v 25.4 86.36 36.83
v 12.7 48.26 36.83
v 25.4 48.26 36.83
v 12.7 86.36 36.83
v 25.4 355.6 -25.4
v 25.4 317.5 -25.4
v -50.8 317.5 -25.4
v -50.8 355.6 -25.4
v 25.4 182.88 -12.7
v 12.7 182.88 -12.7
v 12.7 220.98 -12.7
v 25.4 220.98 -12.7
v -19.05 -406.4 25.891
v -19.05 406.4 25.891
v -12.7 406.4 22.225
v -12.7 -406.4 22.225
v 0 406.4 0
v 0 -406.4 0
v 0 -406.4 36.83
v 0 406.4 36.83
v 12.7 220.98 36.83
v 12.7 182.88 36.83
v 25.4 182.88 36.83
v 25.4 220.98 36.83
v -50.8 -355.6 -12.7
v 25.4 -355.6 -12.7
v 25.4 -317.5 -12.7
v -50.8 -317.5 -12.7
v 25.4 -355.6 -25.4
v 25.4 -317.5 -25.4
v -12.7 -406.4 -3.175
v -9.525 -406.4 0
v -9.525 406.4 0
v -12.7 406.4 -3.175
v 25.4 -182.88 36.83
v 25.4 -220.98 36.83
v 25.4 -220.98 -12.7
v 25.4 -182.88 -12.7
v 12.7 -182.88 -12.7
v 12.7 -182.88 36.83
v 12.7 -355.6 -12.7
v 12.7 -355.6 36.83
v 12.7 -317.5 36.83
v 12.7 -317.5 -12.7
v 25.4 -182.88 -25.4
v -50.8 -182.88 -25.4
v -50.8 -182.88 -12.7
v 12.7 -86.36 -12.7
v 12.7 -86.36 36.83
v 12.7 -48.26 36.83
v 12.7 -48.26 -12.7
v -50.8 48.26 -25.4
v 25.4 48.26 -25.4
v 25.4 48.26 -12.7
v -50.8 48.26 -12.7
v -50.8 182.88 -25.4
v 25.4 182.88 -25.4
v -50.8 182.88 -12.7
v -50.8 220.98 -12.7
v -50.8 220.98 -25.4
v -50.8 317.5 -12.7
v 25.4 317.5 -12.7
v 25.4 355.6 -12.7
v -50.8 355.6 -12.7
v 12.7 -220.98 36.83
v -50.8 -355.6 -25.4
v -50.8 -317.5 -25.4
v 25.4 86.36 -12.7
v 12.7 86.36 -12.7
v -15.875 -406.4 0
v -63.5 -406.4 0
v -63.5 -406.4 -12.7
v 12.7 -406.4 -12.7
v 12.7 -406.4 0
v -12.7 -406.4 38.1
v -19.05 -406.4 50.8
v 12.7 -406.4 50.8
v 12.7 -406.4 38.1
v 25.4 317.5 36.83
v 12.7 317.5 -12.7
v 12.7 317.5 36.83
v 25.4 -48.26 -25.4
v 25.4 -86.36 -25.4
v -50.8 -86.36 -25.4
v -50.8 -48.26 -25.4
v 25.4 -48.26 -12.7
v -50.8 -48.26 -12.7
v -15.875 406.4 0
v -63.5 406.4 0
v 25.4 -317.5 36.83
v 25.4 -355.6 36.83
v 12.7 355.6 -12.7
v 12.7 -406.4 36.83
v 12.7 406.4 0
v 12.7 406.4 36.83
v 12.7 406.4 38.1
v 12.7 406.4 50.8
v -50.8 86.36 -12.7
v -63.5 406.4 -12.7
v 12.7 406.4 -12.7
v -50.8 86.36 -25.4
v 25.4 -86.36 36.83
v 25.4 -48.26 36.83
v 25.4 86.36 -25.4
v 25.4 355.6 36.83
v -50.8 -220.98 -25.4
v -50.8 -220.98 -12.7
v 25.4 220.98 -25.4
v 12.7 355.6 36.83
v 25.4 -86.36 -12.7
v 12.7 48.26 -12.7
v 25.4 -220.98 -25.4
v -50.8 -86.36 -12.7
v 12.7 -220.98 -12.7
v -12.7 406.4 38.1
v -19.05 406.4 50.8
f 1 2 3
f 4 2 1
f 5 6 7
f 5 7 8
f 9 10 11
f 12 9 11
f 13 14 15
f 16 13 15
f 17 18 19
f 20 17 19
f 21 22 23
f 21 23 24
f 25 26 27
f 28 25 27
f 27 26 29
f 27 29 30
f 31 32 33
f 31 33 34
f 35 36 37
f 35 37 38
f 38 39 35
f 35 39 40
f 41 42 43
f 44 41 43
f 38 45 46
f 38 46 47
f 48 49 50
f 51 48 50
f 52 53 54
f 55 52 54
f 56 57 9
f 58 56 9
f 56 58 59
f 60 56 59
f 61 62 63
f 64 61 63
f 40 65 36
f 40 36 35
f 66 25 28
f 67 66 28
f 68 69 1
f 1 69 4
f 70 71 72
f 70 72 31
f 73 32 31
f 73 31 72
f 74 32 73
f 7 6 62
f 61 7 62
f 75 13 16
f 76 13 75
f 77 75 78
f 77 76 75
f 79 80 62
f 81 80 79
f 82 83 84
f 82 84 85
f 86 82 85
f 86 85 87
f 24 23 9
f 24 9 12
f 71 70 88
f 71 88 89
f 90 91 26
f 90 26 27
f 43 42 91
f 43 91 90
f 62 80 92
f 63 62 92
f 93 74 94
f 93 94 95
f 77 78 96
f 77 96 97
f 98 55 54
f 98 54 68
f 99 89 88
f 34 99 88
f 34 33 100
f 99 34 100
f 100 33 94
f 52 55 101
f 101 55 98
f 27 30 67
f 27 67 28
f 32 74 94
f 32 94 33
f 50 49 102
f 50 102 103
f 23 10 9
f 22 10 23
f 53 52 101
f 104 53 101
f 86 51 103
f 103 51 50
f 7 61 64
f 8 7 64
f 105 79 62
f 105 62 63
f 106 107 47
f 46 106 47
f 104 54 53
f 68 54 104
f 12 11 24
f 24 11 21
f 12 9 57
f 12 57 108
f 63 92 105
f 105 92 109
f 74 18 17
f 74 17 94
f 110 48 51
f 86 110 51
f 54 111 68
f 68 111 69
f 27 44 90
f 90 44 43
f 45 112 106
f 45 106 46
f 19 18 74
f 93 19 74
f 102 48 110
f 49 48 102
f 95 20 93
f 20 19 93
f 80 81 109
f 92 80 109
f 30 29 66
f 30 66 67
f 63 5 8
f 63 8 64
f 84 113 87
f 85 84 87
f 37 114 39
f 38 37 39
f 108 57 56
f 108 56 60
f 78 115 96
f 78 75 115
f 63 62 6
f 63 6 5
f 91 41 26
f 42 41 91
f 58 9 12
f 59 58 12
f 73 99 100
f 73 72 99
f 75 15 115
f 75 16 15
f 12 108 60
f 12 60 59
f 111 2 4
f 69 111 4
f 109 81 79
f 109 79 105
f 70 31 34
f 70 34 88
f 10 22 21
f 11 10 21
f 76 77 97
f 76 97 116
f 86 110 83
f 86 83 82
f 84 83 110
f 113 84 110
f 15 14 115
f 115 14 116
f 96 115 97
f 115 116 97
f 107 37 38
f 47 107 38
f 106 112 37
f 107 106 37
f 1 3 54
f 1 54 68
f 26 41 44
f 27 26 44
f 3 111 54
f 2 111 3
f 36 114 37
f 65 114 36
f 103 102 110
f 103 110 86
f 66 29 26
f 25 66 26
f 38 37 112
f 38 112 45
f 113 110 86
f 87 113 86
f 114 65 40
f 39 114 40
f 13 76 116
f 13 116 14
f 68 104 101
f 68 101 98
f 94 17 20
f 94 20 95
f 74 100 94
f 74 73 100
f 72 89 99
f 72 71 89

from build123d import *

# Parameters (mm, degrees)
F3_W      = 12.7
F3_H      = 36.83
F6_DEPTH  = 406.4
F7_DEPTH  = 406.4
F5_W      = 25.4
F5_H      = 12.7
F8_DEPTH  = 406.4
F9_W      = 38.1
F9_H      = 49.53
F10_DEPTH = 12.7
F11_W     = 38.1
F11_H     = 12.7
F12_DEPTH = 76.2


# Not quite as in the source:
# - a variable given as a bare number and used for a length is read in inches; the dataset says mm whatever the document's units were


with BuildPart() as f6:
    # F3 (on Front) → F6 (new body, symmetric)
    with BuildSketch(Plane.XZ):
        with Locations((6.35, 18.415)):
            Rectangle(F3_W, F3_H)
    extrude(amount=F6_DEPTH, both=True)


with BuildPart() as f7:
    # F4 (on Front) → F7 (new body, symmetric)
    with BuildSketch(Plane.XZ):
        Polygon((12.7, -12.7), (12.7, 0), (-9.525, 0), (-12.7, -3.175), (-15.875, 0), (-63.5, 0), (-63.5, -12.7), align=None)
    extrude(amount=F7_DEPTH, both=True)


with BuildPart() as f8:
    # F5 (on Front) → F8 (new body, symmetric)
    with BuildSketch(Plane.XZ):
        with Locations((0, 44.45)):
            Rectangle(F5_W, F5_H)
        Polygon((-12.7, 22.225), (-12.7, 38.1), (-12.7, 50.8), (-19.05, 50.8), (-19.05, 25.8911742094), align=None)
    extrude(amount=F8_DEPTH, both=True)


with BuildPart() as f10:
    # F9 (on face) → F10 (new body)
    with BuildSketch(Plane.YZ.offset(12.7)):
        with Locations((-336.55, 12.065)):
            Rectangle(F9_W, F9_H)
    extrude(amount=F10_DEPTH)


with BuildPart() as f10b:
    # F9 (on face) → F10, piece 2 (new body)
    with BuildSketch(Plane.YZ.offset(12.7)):
        with Locations((-201.93, 12.065)):
            Rectangle(F9_W, F9_H)
    extrude(amount=F10_DEPTH)


with BuildPart() as f10c:
    # F9 (on face) → F10, piece 3 (new body)
    with BuildSketch(Plane.YZ.offset(12.7)):
        with Locations((-67.31, 12.065)):
            Rectangle(F9_W, F9_H)
    extrude(amount=F10_DEPTH)


with BuildPart() as f10d:
    # F9 (on face) → F10, piece 4 (new body)
    with BuildSketch(Plane.YZ.offset(12.7)):
        with Locations((67.31, 12.065)):
            Rectangle(F9_W, F9_H)
    extrude(amount=F10_DEPTH)


with BuildPart() as f10e:
    # F9 (on face) → F10, piece 5 (new body)
    with BuildSketch(Plane.YZ.offset(12.7)):
        with Locations((201.93, 12.065)):
            Rectangle(F9_W, F9_H)
    extrude(amount=F10_DEPTH)


with BuildPart() as f10f:
    # F9 (on face) → F10, piece 6 (new body)
    with BuildSketch(Plane.YZ.offset(12.7)):
        with Locations((336.55, 12.065)):
            Rectangle(F9_W, F9_H)
    extrude(amount=F10_DEPTH)


with BuildPart() as f12:
    # F11 (on face) → F12 (new body)
    with BuildSketch(Plane.YZ.offset(25.4)):
        with Locations((-336.55, -19.05)):
            Rectangle(F11_W, F11_H)
    extrude(amount=-F12_DEPTH)


with BuildPart() as f12b:
    # F11 (on face) → F12, piece 2 (new body)
    with BuildSketch(Plane.YZ.offset(25.4)):
        with Locations((-201.93, -19.05)):
            Rectangle(F11_W, F11_H)
    extrude(amount=-F12_DEPTH)


with BuildPart() as f12c:
    # F11 (on face) → F12, piece 3 (new body)
    with BuildSketch(Plane.YZ.offset(25.4)):
        with Locations((-67.31, -19.05)):
            Rectangle(F11_W, F11_H)
    extrude(amount=-F12_DEPTH)


with BuildPart() as f12d:
    # F11 (on face) → F12, piece 4 (new body)
    with BuildSketch(Plane.YZ.offset(25.4)):
        with Locations((67.31, -19.05)):
            Rectangle(F11_W, F11_H)
    extrude(amount=-F12_DEPTH)


with BuildPart() as f12e:
    # F11 (on face) → F12, piece 5 (new body)
    with BuildSketch(Plane.YZ.offset(25.4)):
        with Locations((201.93, -19.05)):
            Rectangle(F11_W, F11_H)
    extrude(amount=-F12_DEPTH)


with BuildPart() as f12f:
    # F11 (on face) → F12, piece 6 (new body)
    with BuildSketch(Plane.YZ.offset(25.4)):
        with Locations((336.55, -19.05)):
            Rectangle(F11_W, F11_H)
    extrude(amount=-F12_DEPTH)


solid = Compound([f6.part, f7.part, f8.part, f10.part, f10b.part, f10c.part, f10d.part, f10e.part, f10f.part, f12.part, f12b.part, f12c.part, f12d.part, f12e.part, f12f.part])
